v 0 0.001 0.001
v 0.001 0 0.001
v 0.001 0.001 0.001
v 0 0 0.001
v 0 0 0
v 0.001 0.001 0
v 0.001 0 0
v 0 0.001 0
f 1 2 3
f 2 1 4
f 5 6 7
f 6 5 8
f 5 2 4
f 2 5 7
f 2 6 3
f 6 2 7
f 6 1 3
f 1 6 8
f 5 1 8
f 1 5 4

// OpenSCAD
// file: ../src/frontend/ut_polyline.scad
// ut_polyline — the incumbent frontend: waypoints plus per-vertex fillet radii.
//
// The arithmetic is reference/axford/curvedPipe.scad:71-105 verbatim -- the one
// unambiguously correct piece of the old library (docs/salvage.md §1) -- plus
// the three guards it never had. Those guards are the whole point: each of the
// three inputs below used to produce WRONG GEOMETRY SILENTLY.

// clang-format off
use <../ut_core.scad>;
use <../ut_math.scad>;
use <../ut_path.scad>;
// clang-format on

// r may be a scalar (applied to interior vertices only), a list of len(pts)
// (indexed by vertex, ends ignored), or a list of len(pts)-2 (interior only --
// the legacy `radii` spelling).
function _ut_r_at(r, k, n) = is_num(r) ? r : len(r) == n ? r[k] : r[k - 1];

function ut_polyline(pts, r = 0, closed = false, frame = "transport", normal = undef,
                     twist = 0) = assert(len(pts) >= 2, "ut_polyline(): need at least 2 points")
    assert(is_num(r) || len(r) == len(pts) || len(r) == len(pts) - 2,
           str("ut_polyline(): r must be a scalar, or a list of ", len(pts), " or ", len(pts) - 2, " values"))
        assert(closed == false, "ut_polyline(): closed paths land in a later phase")
            let(n = len(pts), dirs = [for (i = [0:n - 2]) pts[i + 1] - pts[i]], lens = [for (d = dirs) norm(d)],
                // vertex-indexed; ends are 0
                angs = [for (k = [0:n - 1])(k == 0 || k == n - 1) ? 0 : _ut_defl(dirs[k - 1], dirs[k], k, pts)],
                insets = [for (k = [0:n - 1]) angs[k] < ut_eps() ? 0 : _ut_r_at(r, k, n) * tan(angs[k] / 2)],
                ok = _ut_fits(lens, insets, 0, pts, r))
                ut_spine([for (i = [0:n - 2]) each concat(_ut_leg(pts, dirs, lens, insets, i),
                                                          (i < n - 2 && angs[i + 1] >= ut_eps())
                                                              ? [_ut_bend(pts, dirs, insets, angs, i + 1, r, n)]
                                                              : [])],
                         false,
                         concat([ [ "frame", frame ], [ "twist", twist ] ],
                                is_undef(normal) ? [] : [[ "normal", normal ]]));

// GUARD 1 and 2 -- the deflection angle, with the two degeneracies that used to
// vanish silently. A 180 deg doubleback gives tan(90) = inf and [nan,nan,nan];
// a collinear waypoint with r>0 gives a NaN arc centre.
function _ut_defl(d1, d2, k, pts) = let(a = ut_turn(d1, d2))
    assert(a < 180 - 1e-6,
           str("ut_polyline(): 180 degree reversal at vertex ", k, " ", pts[k],
               " -- a path cannot double back on itself (tan(90) is inf, and the segment would silently vanish)")) a;

// GUARD 3 -- the overlap bug. Verified: the same path at radii [20,20] renders
// genus 1 and at [80,80] on a 100 mm leg renders GENUS 2 -- an extra through-hole
// -- with zero diagnostics, because OpenSCAD emits nothing for a non-positive
// extrusion height. ERROR, never "scale to fit": on a doubleback that rule
// scales the radius to exactly 0, which is itself NaN. See PLAN.md §9.5.
function _ut_fits(lens, insets, i, pts,
                  r) = i >= len(lens)
                           ? true
                           : let(need = insets[i] + insets[i + 1], have = lens[i])
                                 assert(have - need > -ut_eps(),
                                        str("ut_polyline(): fillet radii do not fit on the leg from ", pts[i], " to ",
                                            pts[i + 1], " -- leg is ", have, " mm but the two bends need ", need,
                                            " mm of tangent length (", insets[i], " + ", insets[i + 1],
                                            "). Reduce the radius at one of those vertices."))
                                     _ut_fits(lens, insets, i + 1, pts, r);

// The trimmed straight. Omitted entirely when two bends are exactly tangent.
function _ut_leg(pts, dirs, lens, insets, i) = let(u = ut_unit(dirs[i]), a = pts[i] + insets[i] * u,
                                                   b = pts[i + 1] - insets[i + 1] * u,
                                                   rem = lens[i] - insets[i] - insets[i + 1]) rem
                                                       > ut_eps()
                                                   ? [ut_line(a, b)]
                                                   : [];

// The arc at an interior vertex. The centre lies along the internal bisector at
// r / cos(ang/2) from the vertex; see docs/salvage.md §1 for the derivation.
function _ut_bend(pts, dirs, insets, angs, k, r,
                  n) = let(u1 = ut_unit(dirs[k - 1]), u2 = ut_unit(dirs[k]), ang = angs[k], rad = _ut_r_at(r, k, n),
                           tin = pts[k] - insets[k] * u1, axis = ut_unit(cross(dirs[k - 1], dirs[k])),
                           c = pts[k] + ut_unit(u2 - u1) * (rad / cos(ang / 2)), uu = ut_unit(tin - c),
                           vv = cross(axis, uu)) ut_arc(c, uu, vv, rad, ang);
// file: ../src/ut_port.scad
// ut_port — the termination seam, and nothing more (ADR 0005).
//
// uniTube ships this record and a placement module. It ships zero threads,
// barbs, clamps, sockets or grooves; those belong to a separate library that
// consumes only this file. THIS FILE HAS NO DEPENDENCIES ON PURPOSE -- a
// fittings library couples to a data format, not to a geometry engine.
//
//     port = ["utport", name, p, dir, n, profile, s]
//
//   dir  points OUTWARD, away from the material. Fixed once, here.
//   n    is the roll reference at that end -- the CLOCKING. A port carries a
//        full FRAME, not a position and a diameter, so a hex flat, keyway or
//        bayonet lug lands repeatably.

function ut_port(name, p, dir, n, profile, s) = [ "utport", name, p, dir, n, profile, s ];

function ut_port_name(p) = p[1];
function ut_port_pos(p) = p[2];
function ut_port_dir(p) = p[3];
function ut_port_normal(p) = p[4];
function ut_port_profile(p) = p[5];
function ut_port_s(p) = p[6];

// Place children at a port: +Z along the outward direction, +X along the roll
// reference, origin at the end plane. This is already the convention every
// create_*_part in reference/makrokaba/ emits into.
module ut_at_port(port)
{
    d = port[3];
    n = port[4];
    b = cross(d, n);
    p = port[2];
    multmatrix([[n [0], b [0], d [0], p [0]], [n [1], b [1], d [1], p [1]], [n [2], b [2], d [2], p [2]], [0, 0, 0, 1]])
        children();
}

// A debug marker: the outward direction as an arrow, plus the roll reference.
// This is how you verify the seam is right before any termination exists.
module ut_port_marker(port, len = 12)
{
    d = port[3];
    n = port[4];
    p = port[2];
    color("red") translate(p) linear_extrude(0.1) circle(1.2, $fn = 12);
    color("red") translate(p) _ut_arrow(d, len);
    color("blue") translate(p) _ut_arrow(n, len * 0.6);
}

module _ut_arrow(v, len)
{
    u = v / norm(v);
    hull()
    {
        sphere(0.4, $fn = 8);
        translate(u * len) sphere(0.4, $fn = 8);
    }
    translate(u * len) sphere(1.0, $fn = 12);
}
// file: ../src/ut_mesh.scad
// ut_mesh — THE BACKEND. A region swept along stations becomes ONE polyhedron.
//
// This is the whole of uniTube's geometry engine, and it is why the library has
// no dependencies (ADR 0001). Place each 2D loop point into each station frame,
// quad-strip the skins, close the ends, emit. No CSG anywhere along a run.
//
// Quads on a swept skin are generally NON-PLANAR. Every face emitted here is a
// TRIANGLE, so the topology is ours rather than something OpenSCAD guesses at
// ("PolySet has nonplanar faces. Attempting alternate construction").

// clang-format off
use <ut_core.scad>;
use <ut_math.scad>;
use <ut_path.scad>;
use <ut_profile.scad>;
use <ut_port.scad>;
// clang-format on

// Place a profile-local point into a station frame: p + x*n + y*b.
// +X is the station's roll-reference normal, +Y its binormal. That convention is
// what makes "the seam faces up" mean something.
function ut_place(st, q) = let(t = ut_st_t(st), n = ut_st_n(st), b = cross(t, n)) ut_st_p(st) + q[0] * n + q[1] * b;

function _ut_quad(a, b, c, d) = [[a, b, c], [a, c, d]];
function _ut_centroid(loop) = _ut_csum(loop, 0) / len(loop);
function _ut_csum(l, i) = i >= len(l) ? [ 0, 0 ] : l[i] + _ut_csum(l, i + 1);

// ---------------------------------------------------------------- vertices

// Annular (2 loops): per station, N outer points then N inner points.
// Solid (1 loop): per station, N points; plus one centroid vertex per open end.
function ut_mesh_points(rgn, sts, closed = false) =
    let(S = len(sts), N = len(rgn[0]), hollow = len(rgn) > 1) hollow
        ? [for (j = [0:S - 1])
                  each concat([for (q = rgn[0]) ut_place(sts[j], q)], [for (q = rgn[1]) ut_place(sts[j], q)])]
        : concat([for (j = [0:S - 1]) each[for (q = rgn[0]) ut_place(sts[j], q)]],
                 closed ? [] : [ ut_place(sts[0], _ut_centroid(rgn[0])), ut_place(sts[S - 1], _ut_centroid(rgn[0])) ]);

// ---------------------------------------------------------------- faces

function ut_mesh_faces(rgn, sts, closed = false) = let(S = len(sts), N = len(rgn[0]), hollow = len(rgn) > 1,
                                                       last = closed ? S - 1 : S - 2) hollow
                                                       ? _ut_faces_hollow(S, N, closed, last)
                                                       : _ut_faces_solid(S, N, closed, last);

function _ut_oi(j, i, S, N) = (j % S) * 2 * N + (i % N);
function _ut_ii(j, i, S, N) = (j % S) * 2 * N + N + (i % N);
function _ut_vi(j, i, S, N) = (j % S) * N + (i % N);

function _ut_faces_hollow(S, N, closed, last) = concat(
    // outer skin
    [for (j = [0:last], i = [0:N - 1]) each _ut_quad(_ut_oi(j, i, S, N), _ut_oi(j, i + 1, S, N),
                                                     _ut_oi(j + 1, i + 1, S, N), _ut_oi(j + 1, i, S, N))],
    // inner skin -- reversed, so it faces INTO the bore. This one line is where
    // the CCW/CCW storage convention is paid for (see ut_profile.scad header).
    [for (j = [0:last], i = [0:N - 1]) each _ut_quad(_ut_ii(j, i, S, N), _ut_ii(j + 1, i, S, N),
                                                     _ut_ii(j + 1, i + 1, S, N), _ut_ii(j, i + 1, S, N))],
    // annular end caps -- a ring strip, NOT a polygon-with-holes triangulation.
    // This is what keeps the emitter short, and what PROF-2 exists to protect.
    closed ? []
           : concat([for (i = [0:N - 1]) each _ut_quad(_ut_oi(0, i, S, N), _ut_ii(0, i, S, N), _ut_ii(0, i + 1, S, N),
                                                       _ut_oi(0, i + 1, S, N))],
                    [for (i = [0:N - 1]) each _ut_quad(_ut_oi(S - 1, i, S, N), _ut_oi(S - 1, i + 1, S, N),
                                                       _ut_ii(S - 1, i + 1, S, N), _ut_ii(S - 1, i, S, N))]));

function _ut_faces_solid(S, N, closed, last) = let(C0 = S * N, C1 = S * N + 1)
    concat([for (j = [0:last], i = [0:N - 1]) each _ut_quad(_ut_vi(j, i, S, N), _ut_vi(j, i + 1, S, N),
                                                            _ut_vi(j + 1, i + 1, S, N), _ut_vi(j + 1, i, S, N))],
           closed ? []
                  : concat([for (i = [0:N - 1])[C0, _ut_vi(0, i + 1, S, N), _ut_vi(0, i, S, N)]],
                           [for (i = [0:N - 1])[C1, _ut_vi(S - 1, i, S, N), _ut_vi(S - 1, i + 1, S, N)]]));

// ---------------------------------------------------------------- emission

// Sweep a region along stations. ONE polyhedron, no CSG.
module ut_sweep(rgn, sts, closed = false)
{
    assert(len(rgn) > 0, "ut_sweep(): empty region -- a split profile has no bore to sweep");
    assert(len(sts) >= 2, "ut_sweep(): need at least 2 stations");
    polyhedron(points = ut_mesh_points(rgn, sts, closed), faces = ut_mesh_faces(rgn, sts, closed), convexity = 10);
}

// Sweep one run. `part` selects which region: the finished wall, the outer shell,
// or the bore as a positive solid. Assembly NEVER asks for "solid" (rule 5).
module ut_tube(path, prof, part = "solid", opts = [])
{
    sts = ut_stations(path, opts);
    rgn = part == "solid" ? ut_solid_rgn(prof) : part == "shell" ? ut_shell_rgn(prof) : ut_bore_rgn(prof);
    assert(len(rgn) > 0, str("ut_tube(): part=\"", part, "\" is empty for this profile"));
    if (ut_prof_thin(prof))
    {
        echo(str("WARNING [uniTube] PROF-3: wall ", ut_prof_wall(prof), " mm is below the ", ut_min_wall(),
                 " mm minimum -- this may render perfectly and print as a hole"));
    }
    ut_sweep(rgn, sts, ut_closed(path));
}

// The mesh volume of a run, without rendering it. Used by tests/t_mesh.scad to
// catch the silent-material-loss class that CGAL's "Simple: yes" does not.
function ut_run_volume(path, prof, part = "solid", opts = []) = let(sts = ut_stations(path, opts),
                                                                    rgn = part == "solid"   ? ut_solid_rgn(prof)
                                                                          : part == "shell" ? ut_shell_rgn(prof)
                                                                                            : ut_bore_rgn(prof))
    ut_volume(ut_mesh_points(rgn, sts, ut_closed(path)), ut_mesh_faces(rgn, sts, ut_closed(path)));

// The two open ends of a single run. Phase 3 moves this to ut_net.scad, where
// ports are derived from GRAPH DEGREE and a joint-incident end is not a port.
// `dir` points OUTWARD: away from the material at each end.
function ut_run_ports(path, prof, name = "run", opts = []) =
    let(sts = ut_stations(path, opts),
        N = len(sts))[ut_port(str(name, ".a"), ut_st_p(sts[0]), -ut_st_t(sts[0]), ut_st_n(sts[0]), prof, 0),
                      ut_port(str(name, ".b"), ut_st_p(sts[N - 1]), ut_st_t(sts[N - 1]), ut_st_n(sts[N - 1]), prof,
                              ut_st_s(sts[N - 1]))];
// file: ../src/ut_profile.scad
// ut_profile — the cross-section, and the lumen that must survive every union.
//
//     prof = ["utprof", outer, inner, meta]
//
// A "region" here is a list of closed loops: the first is the outer boundary,
// any others are holes. Three regions are derivable from one profile, and the
// entire junction story depends on being able to ask for each independently:
//
//     ut_solid_rgn  [outer, inner]   the finished wall  -> ONE capped polyhedron
//     ut_shell_rgn  [outer]          outer filled, bore ignored
//     ut_bore_rgn   [inner]          the lumen AS A POSITIVE SOLID
//
// NO MODULE EVER EMITS A FINISHED HOLLOW TUBE DURING ASSEMBLY (AGENTS.md rule 5).
//
// WINDING CONVENTION — deviates from PLAN.md §3 deliberately. Both loops are
// stored COUNTER-CLOCKWISE, not outer-CCW/inner-CW. Reversing the inner loop
// would destroy the index correspondence that PROF-2 requires, and the bore
// would no longer be a directly usable positive solid. The mesh emitter orients
// the inner skin's faces instead -- one line, in one place. See ADR 0006.

// clang-format off
use <ut_core.scad>;
use <ut_math.scad>;
// clang-format on

// =============================================================== constructors

// Exactly two of {od, id, wall}. Supplying one or three is an error naming what
// was given -- all three spellings describe the same profile.
function ut_round(od = undef, id = undef, wall = undef, n = undef,
                  a0 = 0) = let(given = (is_undef(od) ? 0 : 1) + (is_undef(id) ? 0 : 1) + (is_undef(wall) ? 0 : 1))
    assert(given == 2, str("ut_round(): give exactly two of od/id/wall, got ", given, " (od=", od, " id=", id,
                           " wall=", wall, ")")) let(OD = is_undef(od) ? id + 2 * wall : od,
                                                     ID = is_undef(id) ? od - 2 * wall : id,
                                                     W = is_undef(wall) ? (od - id) / 2 : wall)
        assert(OD > 0 && ID >= 0 && W > 0,
               str("ut_round(): implied dimensions must be positive (od=", OD, " id=", ID, " wall=", W, ")"))
            assert(ID < OD, str("ut_round(): id (", ID, ") must be less than od (", OD, ")"))
                let(N = is_undef(n) ? ut_fragments(OD / 2, 360) : n)
                    ut_profile(ut_ring(OD / 2, N, a0), ut_ring(ID / 2, N, a0),
                               [ [ "od", OD ], [ "id", ID ], [ "wall", W ], [ "symmetry", 0 ], [ "kind", "round" ] ]);

// A solid rod -- no lumen. Its end caps are triangulated by a centroid fan, so
// the outline must be star-shaped about its centroid (true for any convex shape).
function ut_rod(d, n = undef, a0 = 0) = let(N = is_undef(n) ? ut_fragments(d / 2, 360) : n)
    ut_profile(ut_ring(d / 2, N, a0), undef, [ [ "od", d ], [ "symmetry", 0 ], [ "kind", "rod" ] ]);

// An arbitrary hollow section. Asserts the profile invariants.
function ut_profile(outer, inner = undef, meta = []) = assert(len(outer) >= 3,
                                                              "ut_profile(): outer loop needs at least 3 points")
    assert(ut_area2d(outer) > 0, "PROF-1: outer loop must be counter-clockwise (positive signed area)") assert(
        is_undef(inner) || len(inner) == len(outer),
        str("PROF-2: outer and inner loops must have the SAME point count (got ", len(outer), " and ",
            is_undef(inner) ? 0 : len(inner), ") -- see ADR 0006"))
        assert(is_undef(inner) || ut_area2d(inner) > 0,
               "PROF-1: inner loop must also be counter-clockwise -- the emitter orients it, not the profile")
            assert(
                is_undef(inner) || _ut_aligned(outer, inner),
                "PROF-2: outer and inner loops must be ANGLE-ALIGNED index-for-index. Sampling a bore by perimeter instead of by angle self-intersects the end caps, and CGAL reports only an assertion violation. See ADR 0006.")
                ["utprof", outer, inner, meta];

// PROF-2 correspondence: outer[i] and inner[i] must sit at the same polar angle.
function _ut_aligned(o, i) = max([for (k = [0:len(o) - 1])
                                     abs(_ut_dang(atan2(o[k][1], o[k][0]), atan2(i[k][1], i[k][0])))]) < 1e-6;
function _ut_dang(a, b) = let(d = a - b) d - round(d / 360) * 360;

// =============================================================== accessors

function ut_prof_outer(p) = p[1];
function ut_prof_inner(p) = p[2];
function ut_prof_meta(p) = p[3];
function ut_prof_od(p) = ut_opt(ut_prof_meta(p), "od");
function ut_prof_id(p) = ut_opt(ut_prof_meta(p), "id");
function ut_prof_wall(p) = ut_opt(ut_prof_meta(p), "wall");
function ut_prof_symmetry(p) = ut_opt(ut_prof_meta(p), "symmetry", 0);
function ut_prof_hollow(p) = !is_undef(ut_prof_inner(p));

// =============================================================== regions

function ut_solid_rgn(p) = ut_prof_hollow(p) ? [ ut_prof_outer(p), ut_prof_inner(p) ] : [ut_prof_outer(p)];
function ut_shell_rgn(p) = [ut_prof_outer(p)];
function ut_bore_rgn(p) = ut_prof_hollow(p) ? [ut_prof_inner(p)] : [];

// PROF-3 — a wall below the minimum is a WARNING, not an error: a tube that
// renders perfectly and prints as a hole is the failure this library prevents.
function ut_prof_thin(p) = let(w = ut_prof_wall(p)) !is_undef(w) && w < ut_min_wall();
// file: ../src/ut_math.scad
// ut_math — the ~25 lines that replace 1035 lines of vendored maths.scad and
// vector.scad. See docs/salvage.md §5.

// clang-format off
use <ut_core.scad>;
// clang-format on

function ut_unit(v) = v / norm(v);

// The angle between two 3D vectors, in degrees, ALWAYS via atan2.
// 3D only: cross() requires 3-vectors. For planar angles use atan2(y, x).
// NEVER acos: acos(1.0000001) is nan on OpenSCAD 2021.01 and near-collinear
// waypoints are the most common input there is. See AGENTS.md rule 7.
function ut_turn(a, b) = atan2(norm(cross(a, b)), a *b);

// Rodrigues' rotation of v about unit axis k by ang degrees.
// This is reference/axford/half_curvedPipe.scad:19, generalised. docs/salvage.md §2.
function ut_rotv(v, ang, k) = v * cos(ang) + cross(k, v) * sin(ang) + k * (k * v) * (1 - cos(ang));

// Project ref orthogonal to t and normalise -- the roll-reference seed.
// Falls back from UP to BACK when the run starts parallel to ref, which is the
// vertical-tangent NaN that has killed every previous attempt at this.
function ut_ref_fallback(t, ref = undef) = let(r0 = is_undef(ref) ? ut_up() : ref, tu = ut_unit(t),
                                               r = norm(cross(tu, r0)) < 1e-6
                                                       ? (norm(cross(tu, ut_back())) < 1e-6 ? [ 1, 0, 0 ] : ut_back())
                                                       : r0) ut_unit(r - tu * (r * tu));

// Re-orthogonalise n against t, preserving n's direction as closely as possible.
function ut_ortho(t, n) = let(tu = ut_unit(t), p = n - tu * (n * tu)) ut_unit(p);

// OpenSCAD's own $fn/$fa/$fs rule, applied per-radius and scaled to a partial
// sweep. This is why an arc-native IR gives better meshes than a sampled one:
// each bend gets facets from ITS OWN radius.
function ut_fragments(r, ang = 360) = let(full = $fn > 0 ? max($fn, 3) : ceil(max(min(360 / $fa, r * 2 * PI / $fs), 5)))
    max(2, ceil(full *abs(ang) / 360));

// A closed CCW polygon of n points on a circle of radius r, sampled by ANGLE.
// Angle-sampling is what makes two loops correspondence-aligned (PROF-2 /
// ADR 0006); sampling by arclength does not, and self-intersects the end caps.
function ut_ring(r, n, a0 = 0) = [for (i = [0:n - 1]) let(a = a0 + 360 * i / n)[r * cos(a), r *sin(a)]];

// Signed area of a 2D polygon. Positive = counter-clockwise.
function ut_area2d(poly) = let(n = len(poly)) 0.5 * _ut_area_sum(poly, n, 0);
function _ut_area_sum(p, n, i) = i >= n ? 0
                                        : (p[i][0] * p[(i + 1) % n][1] - p[(i + 1) % n][0] * p[i][1]) +
                                              _ut_area_sum(p, n, i + 1);

// Volume of a closed triangulated mesh by the divergence theorem.
// Replaces BOSL2's vnf_volume(). Verified exact to 6 s.f. against analytic
// values in Phase 0 -- see ADR 0001.
function ut_volume(pts, faces) = _ut_vol(pts, faces, 0);
function _ut_vol(P, F, i) = i >= len(F) ? 0 : _ut_face_vol(P, F[i]) + _ut_vol(P, F, i + 1);
function _ut_face_vol(P, f) = _ut_fan(P, f, 1);
function _ut_fan(P, f, k) = k > len(f) - 2 ? 0 : (P[f[0]] * cross(P[f[k]], P[f[k + 1]])) / 6 + _ut_fan(P, f, k + 1);
// file: ../src/ut_core.scad
// ut_core — shared constants, record access, and assertion helpers.
//
// NOTE: OpenSCAD's `use <>` re-exports functions and modules transitively but
// NOT top-level variables (verified on 2021.01). Every shared constant in this
// library is therefore a zero-argument FUNCTION, not a variable.

function ut_eps() = 1e-9;
function ut_min_wall() = 1.2; // ~3 perimeters on a 0.4 nozzle; a warning, not an error

function ut_up() = [ 0, 0, 1 ];
function ut_back() = [ 0, 1, 0 ];

// --- association lists: opts = [["key", value], ...] --------------------------
function ut_opt(opts, key, dflt = undef) = let(hit = [for (e = opts) if (e[0] == key) e[1]]) len(hit) > 0 ? hit[0]
                                                                                                          : dflt;

function ut_has_opt(opts, key) = len([for (e = opts) if (e[0] == key) 1]) > 0;

// --- tagged records -----------------------------------------------------------
// Every record is ["tag", ...fields]. User code reads them through accessors,
// never by index, so a field can be added without invalidating existing values.
function ut_tag(rec) = is_list(rec) ? rec[0] : undef;
function ut_is(rec, tag) = ut_tag(rec) == tag;

// --- assertion helper ---------------------------------------------------------
// Usage: function f(x) = ut_req(x > 0, str("f(): x must be positive, got ", x)) x * 2;
// Returns true when the condition holds so it can prefix an expression.
function ut_req(cond, msg) = assert(cond, msg) true;
// file: ../src/uniTube.scad
// uniTube — The Universal Tube Library for OpenSCAD
//
// The only public entry point:
//     use <uniTube/src/uniTube.scad>;
//
// NOTE ON `include` vs `use`, verified on OpenSCAD 2021.01:
//   * `use` does NOT transitively re-export. A consumer doing `use <A>` where A
//     does `use <B>` CANNOT see B's functions.
//   * `include` merges a file into this one's scope, and `use` then exports what
//     it finds there. So the entry point must `include`, not `use`.
//   * Relative paths resolve against the file containing the directive, so
//     frontend/'s `../` imports still work when included from here.
// Internal modules use `use <>` for their own dependencies; only this file
// includes. Nothing in src/ emits geometry or echoes on import (AGENTS.md rule 3).

// clang-format off
include <ut_core.scad>;
include <ut_math.scad>;
include <ut_path.scad>;
include <ut_profile.scad>;
include <ut_mesh.scad>;
include <ut_port.scad>;
include <frontend/ut_polyline.scad>;
// clang-format on
// main file
// t_profile — the cross-section and the lumen. Pure data.

// clang-format off
use <../src/uniTube.scad>;
// clang-format on

// --- od / id / wall are three spellings of one profile -----------------------
a = ut_round(od = 12, id = 8);
b = ut_round(od = 12, wall = 2);
c = ut_round(id = 8, wall = 2);
assert(abs(ut_prof_od(a) - 12) < 1e-9 && abs(ut_prof_id(a) - 8) < 1e-9, "ut_round(od,id)");
assert(abs(ut_prof_wall(a) - 2) < 1e-9, "ut_round(od,id): wall is derived");
assert(abs(ut_prof_id(b) - 8) < 1e-9, "ut_round(od,wall): id is derived");
assert(abs(ut_prof_od(c) - 12) < 1e-9, "ut_round(id,wall): od is derived");
assert(len(ut_prof_outer(a)) == len(ut_prof_outer(b)), "all three spellings agree on facet count");

// --- PROF-1: winding ---------------------------------------------------------
assert(ut_area2d(ut_prof_outer(a)) > 0, "PROF-1: outer is CCW");
assert(ut_area2d(ut_prof_inner(a)) > 0, "PROF-1: inner is ALSO CCW -- the emitter orients it, not the profile");

// --- PROF-2: correspondence (ADR 0006) ---------------------------------------
o = ut_prof_outer(a);
i = ut_prof_inner(a);
assert(len(o) == len(i), "PROF-2: equal point count");
assert(max([for (k = [0:len(o) - 1]) abs(atan2(o[k][1], o[k][0]) - atan2(i[k][1], i[k][0]))]) < 1e-6,
       "PROF-2: outer[k] and inner[k] sit at the same polar angle");

// --- the three regions -------------------------------------------------------
assert(len(ut_solid_rgn(a)) == 2, "solid region = outer + bore");
assert(len(ut_shell_rgn(a)) == 1, "shell region = outer only");
assert(len(ut_bore_rgn(a)) == 1, "bore region = the lumen as a POSITIVE solid");
rod = ut_rod(d = 10);
assert(!ut_prof_hollow(rod), "a rod has no lumen");
assert(len(ut_bore_rgn(rod)) == 0, "a rod's bore region is empty -- callers must guard on this");

// --- PROF-3: thin wall is a WARNING, not an error ----------------------------
assert(ut_prof_thin(ut_round(od = 10, id = 8)), "PROF-3: a 1 mm wall is below the minimum");
assert(!ut_prof_thin(ut_round(od = 12, wall = 2)), "PROF-3: a 2 mm wall is fine");

// --- an arbitrary hollow section: square bore in a round shell ---------------
// Sampled BY ANGLE, which is what makes it correspondence-aligned. Sampling the
// square by perimeter instead satisfies the count rule, self-intersects the end
// caps, and CGAL reports only "assertion violation" (ADR 0006).
function sq_by_angle(h, n) = [for (k = [0:n - 1])
        let(t = 360 * k / n, cx = cos(t), cy = sin(t), m = h / max(abs(cx), abs(cy)))[m * cx, m *cy]];
N = len(ut_prof_outer(a));
sqp = ut_profile(ut_ring(6, N), sq_by_angle(3, N), [[ "kind", "square-bore" ]]);
assert(len(ut_solid_rgn(sqp)) == 2, "arbitrary hollow section is a first-class profile");

cube(0.001); // sentinel
